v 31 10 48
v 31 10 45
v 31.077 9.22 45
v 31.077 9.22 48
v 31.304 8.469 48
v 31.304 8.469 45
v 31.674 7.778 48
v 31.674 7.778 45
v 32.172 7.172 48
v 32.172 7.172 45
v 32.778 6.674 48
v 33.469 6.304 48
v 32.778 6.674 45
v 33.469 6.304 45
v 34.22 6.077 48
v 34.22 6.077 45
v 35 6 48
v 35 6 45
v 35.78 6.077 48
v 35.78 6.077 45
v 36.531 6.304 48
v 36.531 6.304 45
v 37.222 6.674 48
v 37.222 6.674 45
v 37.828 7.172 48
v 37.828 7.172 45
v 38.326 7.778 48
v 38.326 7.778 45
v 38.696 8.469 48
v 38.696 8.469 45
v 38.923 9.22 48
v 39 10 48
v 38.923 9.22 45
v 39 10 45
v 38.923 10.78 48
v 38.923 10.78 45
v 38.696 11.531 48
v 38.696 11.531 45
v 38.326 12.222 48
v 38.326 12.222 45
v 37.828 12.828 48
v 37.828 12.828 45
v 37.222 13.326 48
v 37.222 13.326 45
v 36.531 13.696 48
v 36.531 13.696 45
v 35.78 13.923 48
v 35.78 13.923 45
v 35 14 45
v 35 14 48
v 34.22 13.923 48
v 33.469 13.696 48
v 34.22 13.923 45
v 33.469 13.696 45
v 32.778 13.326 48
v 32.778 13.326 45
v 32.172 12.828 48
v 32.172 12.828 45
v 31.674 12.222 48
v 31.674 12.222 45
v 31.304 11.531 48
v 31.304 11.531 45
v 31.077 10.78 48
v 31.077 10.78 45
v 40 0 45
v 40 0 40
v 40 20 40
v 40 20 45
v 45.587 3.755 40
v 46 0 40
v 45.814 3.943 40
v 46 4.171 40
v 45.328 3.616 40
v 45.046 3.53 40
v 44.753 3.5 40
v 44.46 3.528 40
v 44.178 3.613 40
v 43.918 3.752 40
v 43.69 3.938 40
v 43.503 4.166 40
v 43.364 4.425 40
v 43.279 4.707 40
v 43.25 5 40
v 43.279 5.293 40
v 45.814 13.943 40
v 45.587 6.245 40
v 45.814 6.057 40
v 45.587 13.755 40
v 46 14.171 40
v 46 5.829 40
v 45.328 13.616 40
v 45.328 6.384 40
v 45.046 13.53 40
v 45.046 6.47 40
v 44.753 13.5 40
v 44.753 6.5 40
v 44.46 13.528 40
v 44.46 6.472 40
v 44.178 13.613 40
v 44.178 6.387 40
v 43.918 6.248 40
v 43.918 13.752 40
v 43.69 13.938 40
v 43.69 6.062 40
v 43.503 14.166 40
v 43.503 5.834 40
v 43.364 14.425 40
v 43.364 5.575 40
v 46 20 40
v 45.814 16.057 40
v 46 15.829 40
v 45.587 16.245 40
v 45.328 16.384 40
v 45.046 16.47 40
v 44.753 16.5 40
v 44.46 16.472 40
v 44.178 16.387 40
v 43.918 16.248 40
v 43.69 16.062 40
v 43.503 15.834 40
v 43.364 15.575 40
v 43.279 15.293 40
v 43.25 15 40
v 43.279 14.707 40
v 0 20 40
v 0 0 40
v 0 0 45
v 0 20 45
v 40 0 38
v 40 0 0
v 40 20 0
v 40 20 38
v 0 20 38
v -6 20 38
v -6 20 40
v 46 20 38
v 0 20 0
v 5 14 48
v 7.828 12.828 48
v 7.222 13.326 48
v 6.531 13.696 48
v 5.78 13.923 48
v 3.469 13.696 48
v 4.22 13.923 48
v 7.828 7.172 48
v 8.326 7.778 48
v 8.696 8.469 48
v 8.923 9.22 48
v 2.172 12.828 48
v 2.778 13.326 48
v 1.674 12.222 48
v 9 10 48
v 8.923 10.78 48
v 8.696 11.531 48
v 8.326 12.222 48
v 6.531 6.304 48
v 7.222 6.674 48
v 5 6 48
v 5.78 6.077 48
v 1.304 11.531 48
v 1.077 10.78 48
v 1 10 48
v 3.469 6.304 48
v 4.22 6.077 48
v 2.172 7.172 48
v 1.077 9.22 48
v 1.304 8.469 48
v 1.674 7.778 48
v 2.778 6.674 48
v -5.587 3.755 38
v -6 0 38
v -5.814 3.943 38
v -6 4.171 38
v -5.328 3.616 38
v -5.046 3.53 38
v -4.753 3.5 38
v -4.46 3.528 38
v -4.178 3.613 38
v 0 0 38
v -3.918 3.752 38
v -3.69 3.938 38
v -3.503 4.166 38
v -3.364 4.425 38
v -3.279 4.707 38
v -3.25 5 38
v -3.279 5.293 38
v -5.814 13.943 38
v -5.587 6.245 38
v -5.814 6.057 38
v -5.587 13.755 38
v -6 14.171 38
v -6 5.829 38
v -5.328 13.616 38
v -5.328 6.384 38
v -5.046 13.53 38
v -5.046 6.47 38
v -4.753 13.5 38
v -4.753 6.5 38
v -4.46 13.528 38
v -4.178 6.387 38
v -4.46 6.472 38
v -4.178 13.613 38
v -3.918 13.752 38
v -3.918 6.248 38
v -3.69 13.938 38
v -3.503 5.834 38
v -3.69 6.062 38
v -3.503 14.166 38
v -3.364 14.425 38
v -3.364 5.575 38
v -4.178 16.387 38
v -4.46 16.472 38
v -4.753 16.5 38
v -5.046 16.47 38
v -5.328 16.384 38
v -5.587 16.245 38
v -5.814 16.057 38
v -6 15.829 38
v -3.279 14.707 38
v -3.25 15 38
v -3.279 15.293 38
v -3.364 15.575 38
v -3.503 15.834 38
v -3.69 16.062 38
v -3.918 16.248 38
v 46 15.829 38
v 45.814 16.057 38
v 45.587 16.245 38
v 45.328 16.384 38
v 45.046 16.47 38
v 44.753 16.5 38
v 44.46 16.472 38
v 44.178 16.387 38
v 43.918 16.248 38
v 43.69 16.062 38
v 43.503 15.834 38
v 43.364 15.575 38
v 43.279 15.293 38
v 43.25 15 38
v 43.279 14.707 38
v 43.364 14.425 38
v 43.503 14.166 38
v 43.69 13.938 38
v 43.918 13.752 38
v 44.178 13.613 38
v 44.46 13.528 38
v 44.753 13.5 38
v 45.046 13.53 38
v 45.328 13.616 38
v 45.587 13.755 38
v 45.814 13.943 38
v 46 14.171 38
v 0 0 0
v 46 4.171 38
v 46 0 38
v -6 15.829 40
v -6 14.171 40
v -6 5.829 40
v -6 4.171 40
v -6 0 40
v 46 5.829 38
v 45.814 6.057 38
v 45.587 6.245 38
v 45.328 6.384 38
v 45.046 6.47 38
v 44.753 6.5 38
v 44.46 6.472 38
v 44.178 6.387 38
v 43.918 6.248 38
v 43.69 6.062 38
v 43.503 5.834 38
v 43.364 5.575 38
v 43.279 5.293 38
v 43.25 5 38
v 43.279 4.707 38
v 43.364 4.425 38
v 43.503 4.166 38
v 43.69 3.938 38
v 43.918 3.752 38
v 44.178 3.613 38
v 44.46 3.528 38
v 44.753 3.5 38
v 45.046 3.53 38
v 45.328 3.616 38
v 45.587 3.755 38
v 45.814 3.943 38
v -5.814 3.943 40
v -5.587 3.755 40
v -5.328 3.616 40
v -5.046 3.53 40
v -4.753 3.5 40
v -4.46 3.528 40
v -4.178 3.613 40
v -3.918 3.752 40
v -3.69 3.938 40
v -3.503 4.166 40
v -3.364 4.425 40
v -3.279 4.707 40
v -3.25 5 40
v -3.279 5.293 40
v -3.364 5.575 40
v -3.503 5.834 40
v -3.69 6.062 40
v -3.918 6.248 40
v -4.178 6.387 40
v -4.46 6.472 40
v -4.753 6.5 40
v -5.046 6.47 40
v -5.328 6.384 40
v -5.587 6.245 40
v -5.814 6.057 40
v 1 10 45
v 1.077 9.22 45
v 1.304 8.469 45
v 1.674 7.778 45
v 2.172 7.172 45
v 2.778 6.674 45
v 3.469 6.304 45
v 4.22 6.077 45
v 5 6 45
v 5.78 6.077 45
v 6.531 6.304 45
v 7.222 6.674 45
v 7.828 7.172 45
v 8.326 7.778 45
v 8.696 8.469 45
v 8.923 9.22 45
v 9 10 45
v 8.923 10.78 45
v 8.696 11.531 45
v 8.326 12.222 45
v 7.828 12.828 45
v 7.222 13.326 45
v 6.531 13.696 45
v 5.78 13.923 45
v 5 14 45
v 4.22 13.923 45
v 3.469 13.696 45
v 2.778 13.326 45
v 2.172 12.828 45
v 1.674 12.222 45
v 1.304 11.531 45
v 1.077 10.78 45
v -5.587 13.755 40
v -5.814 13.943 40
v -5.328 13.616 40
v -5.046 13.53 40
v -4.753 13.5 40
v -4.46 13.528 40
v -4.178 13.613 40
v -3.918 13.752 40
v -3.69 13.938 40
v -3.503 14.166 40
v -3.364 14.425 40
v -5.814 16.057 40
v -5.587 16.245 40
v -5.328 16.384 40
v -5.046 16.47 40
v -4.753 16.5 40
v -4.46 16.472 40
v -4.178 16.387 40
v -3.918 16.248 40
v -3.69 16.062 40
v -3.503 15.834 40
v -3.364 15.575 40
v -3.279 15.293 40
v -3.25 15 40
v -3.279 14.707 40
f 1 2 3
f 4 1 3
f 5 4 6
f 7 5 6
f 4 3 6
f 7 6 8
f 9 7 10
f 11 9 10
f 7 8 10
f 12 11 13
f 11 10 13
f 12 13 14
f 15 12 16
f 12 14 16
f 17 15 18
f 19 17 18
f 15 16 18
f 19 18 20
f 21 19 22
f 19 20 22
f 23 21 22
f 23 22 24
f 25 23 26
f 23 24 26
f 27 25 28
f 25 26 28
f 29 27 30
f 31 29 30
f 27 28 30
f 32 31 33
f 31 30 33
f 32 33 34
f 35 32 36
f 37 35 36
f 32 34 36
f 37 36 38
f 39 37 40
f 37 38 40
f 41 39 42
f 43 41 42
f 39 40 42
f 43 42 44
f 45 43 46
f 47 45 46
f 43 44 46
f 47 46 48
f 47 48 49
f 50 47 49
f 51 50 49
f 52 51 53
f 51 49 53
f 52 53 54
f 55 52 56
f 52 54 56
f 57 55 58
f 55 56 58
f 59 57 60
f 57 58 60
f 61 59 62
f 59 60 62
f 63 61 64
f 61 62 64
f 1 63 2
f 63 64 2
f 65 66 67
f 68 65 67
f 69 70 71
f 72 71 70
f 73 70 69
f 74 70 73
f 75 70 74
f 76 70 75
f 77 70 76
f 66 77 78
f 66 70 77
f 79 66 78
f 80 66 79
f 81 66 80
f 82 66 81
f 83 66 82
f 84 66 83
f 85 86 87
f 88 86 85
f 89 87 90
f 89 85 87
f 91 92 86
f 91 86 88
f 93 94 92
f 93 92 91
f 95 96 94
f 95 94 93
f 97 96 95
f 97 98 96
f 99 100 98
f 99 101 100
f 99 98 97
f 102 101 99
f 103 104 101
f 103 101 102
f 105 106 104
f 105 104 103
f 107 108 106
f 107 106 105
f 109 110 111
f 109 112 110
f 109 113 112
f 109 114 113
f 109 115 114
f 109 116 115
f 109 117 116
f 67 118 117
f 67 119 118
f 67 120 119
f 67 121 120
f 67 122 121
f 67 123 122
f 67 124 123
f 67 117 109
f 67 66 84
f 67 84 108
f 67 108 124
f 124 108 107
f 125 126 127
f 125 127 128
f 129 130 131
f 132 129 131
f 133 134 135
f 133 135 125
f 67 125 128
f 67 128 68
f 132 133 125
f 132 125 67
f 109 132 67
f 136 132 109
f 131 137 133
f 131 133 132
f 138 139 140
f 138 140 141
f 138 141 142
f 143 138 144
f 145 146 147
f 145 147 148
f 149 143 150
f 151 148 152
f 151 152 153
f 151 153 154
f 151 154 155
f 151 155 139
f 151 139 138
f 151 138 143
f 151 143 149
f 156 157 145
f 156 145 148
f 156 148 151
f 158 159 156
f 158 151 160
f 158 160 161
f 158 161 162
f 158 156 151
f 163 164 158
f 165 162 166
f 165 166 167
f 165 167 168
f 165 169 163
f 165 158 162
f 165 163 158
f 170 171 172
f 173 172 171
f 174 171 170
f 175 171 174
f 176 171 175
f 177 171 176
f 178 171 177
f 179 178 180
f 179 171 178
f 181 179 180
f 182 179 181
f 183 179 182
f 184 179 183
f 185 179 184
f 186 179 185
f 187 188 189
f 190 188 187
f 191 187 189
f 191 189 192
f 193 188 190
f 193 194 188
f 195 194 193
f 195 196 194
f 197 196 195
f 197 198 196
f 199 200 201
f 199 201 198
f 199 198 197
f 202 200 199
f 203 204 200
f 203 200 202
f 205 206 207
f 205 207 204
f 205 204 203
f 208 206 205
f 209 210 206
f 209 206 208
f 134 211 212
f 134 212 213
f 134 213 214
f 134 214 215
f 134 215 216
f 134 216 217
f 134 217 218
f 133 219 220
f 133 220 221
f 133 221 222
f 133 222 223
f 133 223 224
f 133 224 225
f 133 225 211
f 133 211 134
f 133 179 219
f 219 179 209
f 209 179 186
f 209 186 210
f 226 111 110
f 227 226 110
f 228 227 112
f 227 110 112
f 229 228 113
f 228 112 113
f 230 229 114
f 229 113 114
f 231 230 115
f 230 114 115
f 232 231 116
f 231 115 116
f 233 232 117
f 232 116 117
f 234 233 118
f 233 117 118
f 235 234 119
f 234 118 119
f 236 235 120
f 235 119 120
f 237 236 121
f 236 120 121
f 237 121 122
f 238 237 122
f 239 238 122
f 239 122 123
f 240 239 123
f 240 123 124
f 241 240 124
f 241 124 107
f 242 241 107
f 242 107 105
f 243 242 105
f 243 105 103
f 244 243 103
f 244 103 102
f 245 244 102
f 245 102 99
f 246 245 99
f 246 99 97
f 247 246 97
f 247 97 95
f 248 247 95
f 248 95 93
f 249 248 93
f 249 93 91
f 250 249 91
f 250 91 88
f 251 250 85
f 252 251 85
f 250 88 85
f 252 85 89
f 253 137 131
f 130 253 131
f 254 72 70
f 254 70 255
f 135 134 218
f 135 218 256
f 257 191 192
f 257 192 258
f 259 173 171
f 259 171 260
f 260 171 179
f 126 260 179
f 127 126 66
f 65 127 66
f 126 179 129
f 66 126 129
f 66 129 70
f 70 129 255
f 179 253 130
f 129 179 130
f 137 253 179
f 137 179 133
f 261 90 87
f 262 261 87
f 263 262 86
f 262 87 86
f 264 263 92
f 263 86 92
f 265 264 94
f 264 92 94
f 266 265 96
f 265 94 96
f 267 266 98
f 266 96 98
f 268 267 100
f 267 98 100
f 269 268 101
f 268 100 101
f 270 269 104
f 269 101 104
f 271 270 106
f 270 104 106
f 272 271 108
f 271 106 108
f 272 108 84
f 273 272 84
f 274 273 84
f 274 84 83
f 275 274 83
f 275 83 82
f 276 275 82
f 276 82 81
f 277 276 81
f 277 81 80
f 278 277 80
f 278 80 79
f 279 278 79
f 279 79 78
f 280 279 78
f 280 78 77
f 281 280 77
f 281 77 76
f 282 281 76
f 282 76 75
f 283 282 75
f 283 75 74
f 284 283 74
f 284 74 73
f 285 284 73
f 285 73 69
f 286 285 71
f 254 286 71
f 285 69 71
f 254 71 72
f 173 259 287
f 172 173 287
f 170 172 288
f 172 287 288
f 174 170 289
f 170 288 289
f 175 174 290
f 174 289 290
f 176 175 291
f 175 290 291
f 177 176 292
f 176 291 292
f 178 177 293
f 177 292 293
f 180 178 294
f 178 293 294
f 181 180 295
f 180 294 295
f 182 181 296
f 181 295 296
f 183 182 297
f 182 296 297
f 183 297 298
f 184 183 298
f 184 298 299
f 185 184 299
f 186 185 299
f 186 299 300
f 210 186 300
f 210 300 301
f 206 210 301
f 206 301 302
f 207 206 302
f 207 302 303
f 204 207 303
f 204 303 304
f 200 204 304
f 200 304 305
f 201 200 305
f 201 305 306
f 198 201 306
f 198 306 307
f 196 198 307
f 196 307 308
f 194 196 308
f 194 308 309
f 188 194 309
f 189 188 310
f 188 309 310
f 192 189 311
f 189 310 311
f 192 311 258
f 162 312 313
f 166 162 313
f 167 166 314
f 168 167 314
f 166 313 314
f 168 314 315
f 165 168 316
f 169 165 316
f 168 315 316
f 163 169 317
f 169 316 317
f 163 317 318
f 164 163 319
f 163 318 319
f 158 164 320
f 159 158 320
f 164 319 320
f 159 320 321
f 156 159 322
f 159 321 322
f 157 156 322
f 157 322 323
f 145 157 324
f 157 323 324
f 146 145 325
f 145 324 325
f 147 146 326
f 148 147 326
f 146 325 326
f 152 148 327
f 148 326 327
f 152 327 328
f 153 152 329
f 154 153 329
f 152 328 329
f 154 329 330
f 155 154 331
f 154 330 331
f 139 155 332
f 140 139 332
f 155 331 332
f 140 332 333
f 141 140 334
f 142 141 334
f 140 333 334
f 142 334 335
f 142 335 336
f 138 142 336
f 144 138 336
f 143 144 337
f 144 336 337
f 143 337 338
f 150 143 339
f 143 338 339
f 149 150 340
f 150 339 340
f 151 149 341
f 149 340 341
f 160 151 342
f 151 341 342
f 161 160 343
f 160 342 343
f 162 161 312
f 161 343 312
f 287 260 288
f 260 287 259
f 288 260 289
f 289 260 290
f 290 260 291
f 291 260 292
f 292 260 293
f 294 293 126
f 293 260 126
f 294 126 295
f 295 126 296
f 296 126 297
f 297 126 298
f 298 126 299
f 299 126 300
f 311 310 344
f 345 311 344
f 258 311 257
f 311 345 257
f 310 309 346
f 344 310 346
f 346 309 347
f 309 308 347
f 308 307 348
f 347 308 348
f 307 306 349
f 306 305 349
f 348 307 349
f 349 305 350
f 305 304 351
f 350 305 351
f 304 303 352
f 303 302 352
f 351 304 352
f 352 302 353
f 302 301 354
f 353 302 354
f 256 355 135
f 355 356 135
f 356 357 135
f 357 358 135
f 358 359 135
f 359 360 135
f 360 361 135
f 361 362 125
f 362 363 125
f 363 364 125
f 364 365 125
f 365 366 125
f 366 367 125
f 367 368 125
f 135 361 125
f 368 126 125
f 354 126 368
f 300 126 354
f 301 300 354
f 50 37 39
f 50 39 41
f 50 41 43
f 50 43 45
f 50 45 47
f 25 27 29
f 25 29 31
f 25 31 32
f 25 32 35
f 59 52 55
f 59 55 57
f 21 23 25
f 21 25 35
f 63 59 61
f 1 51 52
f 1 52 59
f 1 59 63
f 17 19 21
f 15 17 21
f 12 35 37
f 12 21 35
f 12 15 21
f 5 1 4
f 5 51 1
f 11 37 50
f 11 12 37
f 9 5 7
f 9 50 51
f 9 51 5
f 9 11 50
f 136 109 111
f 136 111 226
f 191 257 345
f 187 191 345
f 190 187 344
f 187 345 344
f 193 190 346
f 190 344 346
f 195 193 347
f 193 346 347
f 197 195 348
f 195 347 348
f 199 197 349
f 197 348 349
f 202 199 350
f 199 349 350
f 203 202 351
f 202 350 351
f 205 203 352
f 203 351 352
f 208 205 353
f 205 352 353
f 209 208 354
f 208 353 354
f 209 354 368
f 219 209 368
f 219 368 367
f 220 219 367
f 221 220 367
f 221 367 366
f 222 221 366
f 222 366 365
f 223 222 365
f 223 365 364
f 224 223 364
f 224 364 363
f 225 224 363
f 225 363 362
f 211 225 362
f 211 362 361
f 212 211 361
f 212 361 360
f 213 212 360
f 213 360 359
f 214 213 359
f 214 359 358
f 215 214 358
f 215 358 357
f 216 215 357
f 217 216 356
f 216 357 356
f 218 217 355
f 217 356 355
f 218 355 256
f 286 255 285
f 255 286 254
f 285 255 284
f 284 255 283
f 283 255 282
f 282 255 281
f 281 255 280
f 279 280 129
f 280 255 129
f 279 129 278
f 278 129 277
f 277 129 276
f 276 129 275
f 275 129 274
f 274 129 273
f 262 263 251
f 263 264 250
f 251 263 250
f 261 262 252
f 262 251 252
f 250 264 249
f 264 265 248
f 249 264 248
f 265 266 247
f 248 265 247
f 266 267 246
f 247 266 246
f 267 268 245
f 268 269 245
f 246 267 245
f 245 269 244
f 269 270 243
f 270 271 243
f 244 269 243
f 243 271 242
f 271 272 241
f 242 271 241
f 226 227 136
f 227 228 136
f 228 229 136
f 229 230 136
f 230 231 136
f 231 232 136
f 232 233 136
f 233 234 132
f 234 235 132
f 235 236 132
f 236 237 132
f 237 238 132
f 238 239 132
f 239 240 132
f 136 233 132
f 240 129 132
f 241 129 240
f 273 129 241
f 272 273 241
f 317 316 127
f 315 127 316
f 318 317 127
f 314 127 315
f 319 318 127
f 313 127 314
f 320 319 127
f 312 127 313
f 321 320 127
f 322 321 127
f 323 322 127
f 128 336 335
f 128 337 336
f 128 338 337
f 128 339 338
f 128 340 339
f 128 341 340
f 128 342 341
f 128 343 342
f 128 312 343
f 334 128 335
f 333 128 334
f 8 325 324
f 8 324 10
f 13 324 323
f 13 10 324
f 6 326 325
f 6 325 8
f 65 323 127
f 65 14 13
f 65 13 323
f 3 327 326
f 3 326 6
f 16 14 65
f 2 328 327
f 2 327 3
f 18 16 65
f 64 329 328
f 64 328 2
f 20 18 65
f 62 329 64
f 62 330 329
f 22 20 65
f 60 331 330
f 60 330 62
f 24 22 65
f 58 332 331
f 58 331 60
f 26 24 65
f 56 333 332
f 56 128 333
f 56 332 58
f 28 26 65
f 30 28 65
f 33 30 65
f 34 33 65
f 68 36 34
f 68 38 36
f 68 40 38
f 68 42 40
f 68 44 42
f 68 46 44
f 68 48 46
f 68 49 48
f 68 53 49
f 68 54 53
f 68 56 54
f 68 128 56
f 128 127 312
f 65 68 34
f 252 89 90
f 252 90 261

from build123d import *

# Parameters (mm, degrees)
ESQUISSE1_W             = 40
ESQUISSE1_H             = 20
BOSS_EXTRU_1_DEPTH      = 45
ESQUISSE2_R             = 4
BOSS_EXTRU_2_DEPTH      = 3
ESQUISSE3_W             = 2
ESQUISSE3_H             = 20
BOSS_EXTRU_3_DEPTH      = 6
ESQUISSE4_W             = 2
ESQUISSE4_H             = 20
BOSS_EXTRU_4_DEPTH      = 6
ESQUISSE5_R             = 1.5
ENL_V_MAT_EXTRU_1_DEPTH = 6


with BuildPart() as part:
    # Esquisse1 → Boss.-Extru.1 (new body)
    with BuildSketch(Plane.XY):
        with Locations((20, 10)):
            Rectangle(ESQUISSE1_W, ESQUISSE1_H)
    extrude(amount=BOSS_EXTRU_1_DEPTH)

    # Esquisse2 → Boss.-Extru.2 (add)
    with BuildSketch(Plane.XY.offset(45)):
        with Locations(Location((5, 10, 0), (0, 0, 180))):
            Circle(ESQUISSE2_R)
        with Locations(Location((35, 10, 0), (0, 0, 180))):
            Circle(ESQUISSE2_R)
    extrude(amount=BOSS_EXTRU_2_DEPTH)

    # Esquisse3 → Boss.-Extru.3 (add)
    with BuildSketch(Plane.ZY):
        with Locations((39, 10)):
            Rectangle(ESQUISSE3_W, ESQUISSE3_H)
    extrude(amount=BOSS_EXTRU_3_DEPTH)

    # Esquisse4 → Boss.-Extru.4 (add)
    with BuildSketch(Plane(origin=(40, 0, 0), x_dir=(0, 0, -1), z_dir=(1, 0, 0))):
        with Locations((-39, 10)):
            Rectangle(ESQUISSE4_W, ESQUISSE4_H)
    extrude(amount=BOSS_EXTRU_4_DEPTH)

    # Esquisse5 → Enlèv. mat.-Extru.1 (cut)
    with BuildSketch(Plane.XY.offset(40)):
        with Locations((-4.75, 15)):
            Circle(ESQUISSE5_R)
        with Locations((-4.75, 5)):
            Circle(ESQUISSE5_R)
        with Locations((44.75, 15)):
            Circle(ESQUISSE5_R)
        with Locations((44.75, 5)):
            Circle(ESQUISSE5_R)
    extrude(amount=-ENL_V_MAT_EXTRU_1_DEPTH, mode=Mode.SUBTRACT)


solid = part.part
